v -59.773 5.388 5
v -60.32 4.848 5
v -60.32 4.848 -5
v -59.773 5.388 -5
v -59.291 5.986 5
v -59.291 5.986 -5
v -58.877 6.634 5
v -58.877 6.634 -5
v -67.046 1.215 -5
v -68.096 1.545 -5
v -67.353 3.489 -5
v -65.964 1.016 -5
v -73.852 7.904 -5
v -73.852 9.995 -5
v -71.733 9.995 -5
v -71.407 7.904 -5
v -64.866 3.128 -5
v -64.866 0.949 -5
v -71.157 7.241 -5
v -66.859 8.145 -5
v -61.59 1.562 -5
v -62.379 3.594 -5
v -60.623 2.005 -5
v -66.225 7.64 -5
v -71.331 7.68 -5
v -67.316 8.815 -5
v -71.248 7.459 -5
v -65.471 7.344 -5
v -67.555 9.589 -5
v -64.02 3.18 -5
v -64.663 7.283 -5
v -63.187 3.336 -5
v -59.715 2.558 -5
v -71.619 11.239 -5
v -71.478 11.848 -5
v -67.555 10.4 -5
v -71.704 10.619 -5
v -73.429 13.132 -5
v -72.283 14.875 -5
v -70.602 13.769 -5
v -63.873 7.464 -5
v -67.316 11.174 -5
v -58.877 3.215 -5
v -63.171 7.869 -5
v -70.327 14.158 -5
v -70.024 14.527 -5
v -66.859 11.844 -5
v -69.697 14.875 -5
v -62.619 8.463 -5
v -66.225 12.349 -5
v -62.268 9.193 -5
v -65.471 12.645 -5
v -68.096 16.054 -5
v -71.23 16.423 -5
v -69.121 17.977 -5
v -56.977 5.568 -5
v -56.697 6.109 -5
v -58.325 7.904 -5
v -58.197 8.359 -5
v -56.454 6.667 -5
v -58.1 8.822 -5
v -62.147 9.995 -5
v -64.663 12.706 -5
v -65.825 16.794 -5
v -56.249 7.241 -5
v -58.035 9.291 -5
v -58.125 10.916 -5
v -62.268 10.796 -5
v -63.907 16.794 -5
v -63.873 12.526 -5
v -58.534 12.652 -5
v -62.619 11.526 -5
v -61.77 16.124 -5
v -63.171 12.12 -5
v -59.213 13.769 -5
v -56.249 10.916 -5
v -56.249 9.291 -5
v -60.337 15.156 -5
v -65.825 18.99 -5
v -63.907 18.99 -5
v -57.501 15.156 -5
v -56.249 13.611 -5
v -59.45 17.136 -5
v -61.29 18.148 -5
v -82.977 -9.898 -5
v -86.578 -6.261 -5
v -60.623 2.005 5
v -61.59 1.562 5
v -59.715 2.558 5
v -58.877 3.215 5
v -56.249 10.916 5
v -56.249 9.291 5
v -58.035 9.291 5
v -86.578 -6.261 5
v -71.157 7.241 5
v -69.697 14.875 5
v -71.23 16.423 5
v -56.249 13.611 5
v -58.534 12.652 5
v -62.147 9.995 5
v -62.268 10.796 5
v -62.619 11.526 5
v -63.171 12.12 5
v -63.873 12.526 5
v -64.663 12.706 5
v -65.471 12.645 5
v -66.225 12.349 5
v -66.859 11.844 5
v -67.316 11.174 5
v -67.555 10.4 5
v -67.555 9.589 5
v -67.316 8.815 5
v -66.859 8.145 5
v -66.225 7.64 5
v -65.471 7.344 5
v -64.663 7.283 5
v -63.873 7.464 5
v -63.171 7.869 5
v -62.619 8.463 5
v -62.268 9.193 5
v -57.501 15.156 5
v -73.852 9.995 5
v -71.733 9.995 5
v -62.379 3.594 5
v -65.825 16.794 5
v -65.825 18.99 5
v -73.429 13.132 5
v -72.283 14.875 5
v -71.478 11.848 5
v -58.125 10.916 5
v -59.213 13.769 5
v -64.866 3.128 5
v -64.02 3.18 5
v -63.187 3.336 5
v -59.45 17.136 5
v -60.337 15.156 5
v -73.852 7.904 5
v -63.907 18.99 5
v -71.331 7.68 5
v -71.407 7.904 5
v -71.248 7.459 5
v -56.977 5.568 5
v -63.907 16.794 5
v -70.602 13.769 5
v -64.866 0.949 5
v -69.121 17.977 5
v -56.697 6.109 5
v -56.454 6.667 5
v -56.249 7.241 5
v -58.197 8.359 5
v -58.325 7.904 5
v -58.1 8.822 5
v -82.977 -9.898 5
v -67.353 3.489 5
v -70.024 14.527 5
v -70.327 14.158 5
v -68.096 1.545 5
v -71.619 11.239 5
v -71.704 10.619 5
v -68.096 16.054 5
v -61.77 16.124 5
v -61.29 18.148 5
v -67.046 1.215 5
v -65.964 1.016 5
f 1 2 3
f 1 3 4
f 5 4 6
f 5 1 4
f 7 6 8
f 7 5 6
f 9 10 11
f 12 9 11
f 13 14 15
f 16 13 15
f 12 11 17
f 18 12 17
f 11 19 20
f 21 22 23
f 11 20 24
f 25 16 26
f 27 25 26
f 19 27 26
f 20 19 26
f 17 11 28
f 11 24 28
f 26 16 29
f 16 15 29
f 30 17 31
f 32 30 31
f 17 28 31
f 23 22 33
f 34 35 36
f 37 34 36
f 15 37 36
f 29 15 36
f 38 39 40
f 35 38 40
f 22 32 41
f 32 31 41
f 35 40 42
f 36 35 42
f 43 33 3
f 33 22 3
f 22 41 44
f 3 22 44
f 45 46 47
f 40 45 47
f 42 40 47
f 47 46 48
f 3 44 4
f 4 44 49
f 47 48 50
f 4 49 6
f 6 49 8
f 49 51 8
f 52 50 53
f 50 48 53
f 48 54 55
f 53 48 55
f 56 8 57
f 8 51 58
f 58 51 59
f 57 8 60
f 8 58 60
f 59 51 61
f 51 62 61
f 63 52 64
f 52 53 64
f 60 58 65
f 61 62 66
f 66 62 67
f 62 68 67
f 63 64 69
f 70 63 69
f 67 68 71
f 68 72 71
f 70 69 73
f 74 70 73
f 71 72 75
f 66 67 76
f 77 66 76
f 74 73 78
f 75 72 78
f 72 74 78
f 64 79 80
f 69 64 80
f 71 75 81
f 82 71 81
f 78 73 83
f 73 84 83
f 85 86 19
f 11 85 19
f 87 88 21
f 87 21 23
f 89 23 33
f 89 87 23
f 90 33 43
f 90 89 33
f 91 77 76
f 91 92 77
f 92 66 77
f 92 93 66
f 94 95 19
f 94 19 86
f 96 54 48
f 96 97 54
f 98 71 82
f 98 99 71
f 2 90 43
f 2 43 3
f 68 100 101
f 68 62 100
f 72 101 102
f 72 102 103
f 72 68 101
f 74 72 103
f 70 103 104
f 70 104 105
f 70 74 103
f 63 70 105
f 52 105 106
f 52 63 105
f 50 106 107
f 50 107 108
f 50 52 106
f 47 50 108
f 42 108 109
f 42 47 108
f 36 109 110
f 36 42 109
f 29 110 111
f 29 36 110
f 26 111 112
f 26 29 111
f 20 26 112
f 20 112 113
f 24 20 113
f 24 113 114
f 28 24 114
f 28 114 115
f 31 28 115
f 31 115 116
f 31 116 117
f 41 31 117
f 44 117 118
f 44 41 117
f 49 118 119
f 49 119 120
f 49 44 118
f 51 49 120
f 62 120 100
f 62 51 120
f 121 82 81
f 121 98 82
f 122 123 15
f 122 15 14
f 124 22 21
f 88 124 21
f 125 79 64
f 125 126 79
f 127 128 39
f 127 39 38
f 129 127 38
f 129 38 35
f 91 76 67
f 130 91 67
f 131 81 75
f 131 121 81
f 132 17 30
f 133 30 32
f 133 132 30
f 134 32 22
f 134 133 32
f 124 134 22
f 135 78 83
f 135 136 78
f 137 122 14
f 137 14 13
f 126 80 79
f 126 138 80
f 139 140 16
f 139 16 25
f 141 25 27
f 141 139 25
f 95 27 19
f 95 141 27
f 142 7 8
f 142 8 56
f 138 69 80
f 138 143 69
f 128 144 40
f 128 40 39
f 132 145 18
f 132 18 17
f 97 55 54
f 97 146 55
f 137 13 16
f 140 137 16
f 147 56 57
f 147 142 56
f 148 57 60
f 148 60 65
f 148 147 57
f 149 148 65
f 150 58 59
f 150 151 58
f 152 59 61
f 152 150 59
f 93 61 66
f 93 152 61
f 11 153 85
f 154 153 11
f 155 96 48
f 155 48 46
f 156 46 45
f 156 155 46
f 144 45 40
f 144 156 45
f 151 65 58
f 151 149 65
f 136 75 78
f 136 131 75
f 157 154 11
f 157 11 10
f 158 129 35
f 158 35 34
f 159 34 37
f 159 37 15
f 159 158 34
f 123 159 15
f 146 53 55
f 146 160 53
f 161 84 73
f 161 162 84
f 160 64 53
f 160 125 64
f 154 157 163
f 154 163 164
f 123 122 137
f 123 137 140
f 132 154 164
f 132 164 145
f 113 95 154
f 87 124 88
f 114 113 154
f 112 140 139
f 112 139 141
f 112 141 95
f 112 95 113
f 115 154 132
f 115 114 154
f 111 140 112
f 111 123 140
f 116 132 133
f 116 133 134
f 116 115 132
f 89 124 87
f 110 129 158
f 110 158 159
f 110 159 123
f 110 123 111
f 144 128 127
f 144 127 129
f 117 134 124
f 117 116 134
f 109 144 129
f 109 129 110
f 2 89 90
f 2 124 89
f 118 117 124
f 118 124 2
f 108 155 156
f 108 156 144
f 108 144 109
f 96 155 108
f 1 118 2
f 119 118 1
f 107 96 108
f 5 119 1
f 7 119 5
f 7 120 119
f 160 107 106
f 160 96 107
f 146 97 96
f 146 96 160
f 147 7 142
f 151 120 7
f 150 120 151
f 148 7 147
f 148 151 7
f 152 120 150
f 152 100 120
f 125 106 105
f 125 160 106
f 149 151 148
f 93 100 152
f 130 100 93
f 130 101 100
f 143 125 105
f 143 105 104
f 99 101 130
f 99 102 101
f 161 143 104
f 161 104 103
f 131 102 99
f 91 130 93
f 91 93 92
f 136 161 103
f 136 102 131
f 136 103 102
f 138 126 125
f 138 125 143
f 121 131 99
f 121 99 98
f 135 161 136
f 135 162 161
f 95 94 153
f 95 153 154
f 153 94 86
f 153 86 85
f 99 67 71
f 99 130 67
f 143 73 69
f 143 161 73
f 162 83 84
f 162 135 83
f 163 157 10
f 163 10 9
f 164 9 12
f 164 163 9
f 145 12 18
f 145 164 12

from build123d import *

# Parameters (mm, degrees)
SKETCH1_R           = 2.718976156
BOSS_EXTRUDE1_DEPTH = 5


with BuildPart() as part:
    # Sketch1 → Boss-Extrude1 (new body, symmetric)
    with BuildSketch(Plane.XY):
        with BuildLine():
            Line((-71.230316372, 16.423183965), (-69.697125978, 14.874544766))
            ThreePointArc((-69.697125978, 14.874544766), (-70.178618015, 14.345414894), (-70.602445452, 13.769061439))
            Line((-70.602445452, 13.769061439), (-72.282613853, 14.874544766))
            Line((-72.282613853, 14.874544766), (-73.429019542, 13.132180531))
            Line((-73.429019542, 13.132180531), (-71.477844105, 11.848385459))
            ThreePointArc((-71.477844105, 11.848385459), (-71.668751879, 10.930245938), (-71.732785885, 9.994657565))
            Line((-71.732785885, 9.994657565), (-73.852173913, 9.994657565))
            Line((-73.852173913, 9.994657565), (-73.852173913, 7.904409303))
            Line((-73.852173913, 7.904409303), (-71.406922201, 7.904409303))
            ThreePointArc((-71.406922201, 7.904409303), (-71.290285788, 7.56950355), (-71.156514693, 7.24106602))
            Line((-71.156514693, 7.24106602), (-86.578147363, -6.260758332))
            Line((-86.578147363, -6.260758332), (-82.977208325, -9.89798132))
            Line((-82.977208325, -9.89798132), (-67.353165307, 3.488554168))
            Line((-67.353165307, 3.488554168), (-68.096179637, 1.544987721))
            ThreePointArc((-68.096179637, 1.544987721), (-66.508347558, 1.098932073), (-64.865919209, 0.948580907))
            Line((-64.865919209, 0.948580907), (-64.865919209, 3.127790889))
            ThreePointArc((-64.865919209, 3.127790889), (-63.601066667, 3.24528678), (-62.37949878, 3.593753614))
            Line((-62.37949878, 3.593753614), (-61.590429693, 1.562417569))
            ThreePointArc((-61.590429693, 1.562417569), (-60.160877534, 2.268462787), (-58.877488851, 3.214524472))
            Line((-58.877488851, 3.214524472), (-60.320108421, 4.847866116))
            ThreePointArc((-60.320108421, 4.847866116), (-59.523604951, 5.680316792), (-58.877488851, 6.634217149))
            Line((-58.877488851, 6.634217149), (-56.977051893, 5.567776566))
            ThreePointArc((-56.977051893, 5.567776566), (-56.570785994, 6.386019614), (-56.249119541, 7.24106602))
            Line((-56.249119541, 7.24106602), (-58.324916217, 7.904409303))
            ThreePointArc((-58.324916217, 7.904409303), (-58.144259528, 8.589969318), (-58.035251347, 9.290502395))
            Line((-58.035251347, 9.290502395), (-56.249119541, 9.290502395))
            Line((-56.249119541, 9.290502395), (-56.249119541, 10.916483695))
            Line((-56.249119541, 10.916483695), (-58.125115153, 10.916483695))
            Line((-58.125115153, 10.916483695), (-58.534150947, 12.652206929))
            Line((-58.534150947, 12.652206929), (-56.249119541, 13.611272945))
            Line((-56.249119541, 13.611272945), (-57.500945462, 15.156219029))
            Line((-57.500945462, 15.156219029), (-59.21291168, 13.769061439))
            Line((-59.21291168, 13.769061439), (-60.336886068, 15.156219029))
            Line((-60.336886068, 15.156219029), (-59.44992841, 17.136193302))
            Line((-59.44992841, 17.136193302), (-61.290349947, 18.148130182))
            Line((-61.290349947, 18.148130182), (-61.770458694, 16.124256422))
            Line((-61.770458694, 16.124256422), (-63.907050908, 16.794247959))
            Line((-63.907050908, 16.794247959), (-63.907050908, 18.989771489))
            Line((-63.907050908, 18.989771489), (-65.82478751, 18.989771489))
            Line((-65.82478751, 18.989771489), (-65.82478751, 16.794247959))
            Line((-65.82478751, 16.794247959), (-68.096179637, 16.054300748))
            Line((-68.096179637, 16.054300748), (-69.121307415, 17.977337199))
            Line((-69.121307415, 17.977337199), (-71.230316372, 16.423183965))
        make_face()
        with Locations((-64.865919209, 9.994657565)):
            Circle(SKETCH1_R, mode=Mode.SUBTRACT)
    extrude(amount=BOSS_EXTRUDE1_DEPTH, both=True)


solid = part.part
